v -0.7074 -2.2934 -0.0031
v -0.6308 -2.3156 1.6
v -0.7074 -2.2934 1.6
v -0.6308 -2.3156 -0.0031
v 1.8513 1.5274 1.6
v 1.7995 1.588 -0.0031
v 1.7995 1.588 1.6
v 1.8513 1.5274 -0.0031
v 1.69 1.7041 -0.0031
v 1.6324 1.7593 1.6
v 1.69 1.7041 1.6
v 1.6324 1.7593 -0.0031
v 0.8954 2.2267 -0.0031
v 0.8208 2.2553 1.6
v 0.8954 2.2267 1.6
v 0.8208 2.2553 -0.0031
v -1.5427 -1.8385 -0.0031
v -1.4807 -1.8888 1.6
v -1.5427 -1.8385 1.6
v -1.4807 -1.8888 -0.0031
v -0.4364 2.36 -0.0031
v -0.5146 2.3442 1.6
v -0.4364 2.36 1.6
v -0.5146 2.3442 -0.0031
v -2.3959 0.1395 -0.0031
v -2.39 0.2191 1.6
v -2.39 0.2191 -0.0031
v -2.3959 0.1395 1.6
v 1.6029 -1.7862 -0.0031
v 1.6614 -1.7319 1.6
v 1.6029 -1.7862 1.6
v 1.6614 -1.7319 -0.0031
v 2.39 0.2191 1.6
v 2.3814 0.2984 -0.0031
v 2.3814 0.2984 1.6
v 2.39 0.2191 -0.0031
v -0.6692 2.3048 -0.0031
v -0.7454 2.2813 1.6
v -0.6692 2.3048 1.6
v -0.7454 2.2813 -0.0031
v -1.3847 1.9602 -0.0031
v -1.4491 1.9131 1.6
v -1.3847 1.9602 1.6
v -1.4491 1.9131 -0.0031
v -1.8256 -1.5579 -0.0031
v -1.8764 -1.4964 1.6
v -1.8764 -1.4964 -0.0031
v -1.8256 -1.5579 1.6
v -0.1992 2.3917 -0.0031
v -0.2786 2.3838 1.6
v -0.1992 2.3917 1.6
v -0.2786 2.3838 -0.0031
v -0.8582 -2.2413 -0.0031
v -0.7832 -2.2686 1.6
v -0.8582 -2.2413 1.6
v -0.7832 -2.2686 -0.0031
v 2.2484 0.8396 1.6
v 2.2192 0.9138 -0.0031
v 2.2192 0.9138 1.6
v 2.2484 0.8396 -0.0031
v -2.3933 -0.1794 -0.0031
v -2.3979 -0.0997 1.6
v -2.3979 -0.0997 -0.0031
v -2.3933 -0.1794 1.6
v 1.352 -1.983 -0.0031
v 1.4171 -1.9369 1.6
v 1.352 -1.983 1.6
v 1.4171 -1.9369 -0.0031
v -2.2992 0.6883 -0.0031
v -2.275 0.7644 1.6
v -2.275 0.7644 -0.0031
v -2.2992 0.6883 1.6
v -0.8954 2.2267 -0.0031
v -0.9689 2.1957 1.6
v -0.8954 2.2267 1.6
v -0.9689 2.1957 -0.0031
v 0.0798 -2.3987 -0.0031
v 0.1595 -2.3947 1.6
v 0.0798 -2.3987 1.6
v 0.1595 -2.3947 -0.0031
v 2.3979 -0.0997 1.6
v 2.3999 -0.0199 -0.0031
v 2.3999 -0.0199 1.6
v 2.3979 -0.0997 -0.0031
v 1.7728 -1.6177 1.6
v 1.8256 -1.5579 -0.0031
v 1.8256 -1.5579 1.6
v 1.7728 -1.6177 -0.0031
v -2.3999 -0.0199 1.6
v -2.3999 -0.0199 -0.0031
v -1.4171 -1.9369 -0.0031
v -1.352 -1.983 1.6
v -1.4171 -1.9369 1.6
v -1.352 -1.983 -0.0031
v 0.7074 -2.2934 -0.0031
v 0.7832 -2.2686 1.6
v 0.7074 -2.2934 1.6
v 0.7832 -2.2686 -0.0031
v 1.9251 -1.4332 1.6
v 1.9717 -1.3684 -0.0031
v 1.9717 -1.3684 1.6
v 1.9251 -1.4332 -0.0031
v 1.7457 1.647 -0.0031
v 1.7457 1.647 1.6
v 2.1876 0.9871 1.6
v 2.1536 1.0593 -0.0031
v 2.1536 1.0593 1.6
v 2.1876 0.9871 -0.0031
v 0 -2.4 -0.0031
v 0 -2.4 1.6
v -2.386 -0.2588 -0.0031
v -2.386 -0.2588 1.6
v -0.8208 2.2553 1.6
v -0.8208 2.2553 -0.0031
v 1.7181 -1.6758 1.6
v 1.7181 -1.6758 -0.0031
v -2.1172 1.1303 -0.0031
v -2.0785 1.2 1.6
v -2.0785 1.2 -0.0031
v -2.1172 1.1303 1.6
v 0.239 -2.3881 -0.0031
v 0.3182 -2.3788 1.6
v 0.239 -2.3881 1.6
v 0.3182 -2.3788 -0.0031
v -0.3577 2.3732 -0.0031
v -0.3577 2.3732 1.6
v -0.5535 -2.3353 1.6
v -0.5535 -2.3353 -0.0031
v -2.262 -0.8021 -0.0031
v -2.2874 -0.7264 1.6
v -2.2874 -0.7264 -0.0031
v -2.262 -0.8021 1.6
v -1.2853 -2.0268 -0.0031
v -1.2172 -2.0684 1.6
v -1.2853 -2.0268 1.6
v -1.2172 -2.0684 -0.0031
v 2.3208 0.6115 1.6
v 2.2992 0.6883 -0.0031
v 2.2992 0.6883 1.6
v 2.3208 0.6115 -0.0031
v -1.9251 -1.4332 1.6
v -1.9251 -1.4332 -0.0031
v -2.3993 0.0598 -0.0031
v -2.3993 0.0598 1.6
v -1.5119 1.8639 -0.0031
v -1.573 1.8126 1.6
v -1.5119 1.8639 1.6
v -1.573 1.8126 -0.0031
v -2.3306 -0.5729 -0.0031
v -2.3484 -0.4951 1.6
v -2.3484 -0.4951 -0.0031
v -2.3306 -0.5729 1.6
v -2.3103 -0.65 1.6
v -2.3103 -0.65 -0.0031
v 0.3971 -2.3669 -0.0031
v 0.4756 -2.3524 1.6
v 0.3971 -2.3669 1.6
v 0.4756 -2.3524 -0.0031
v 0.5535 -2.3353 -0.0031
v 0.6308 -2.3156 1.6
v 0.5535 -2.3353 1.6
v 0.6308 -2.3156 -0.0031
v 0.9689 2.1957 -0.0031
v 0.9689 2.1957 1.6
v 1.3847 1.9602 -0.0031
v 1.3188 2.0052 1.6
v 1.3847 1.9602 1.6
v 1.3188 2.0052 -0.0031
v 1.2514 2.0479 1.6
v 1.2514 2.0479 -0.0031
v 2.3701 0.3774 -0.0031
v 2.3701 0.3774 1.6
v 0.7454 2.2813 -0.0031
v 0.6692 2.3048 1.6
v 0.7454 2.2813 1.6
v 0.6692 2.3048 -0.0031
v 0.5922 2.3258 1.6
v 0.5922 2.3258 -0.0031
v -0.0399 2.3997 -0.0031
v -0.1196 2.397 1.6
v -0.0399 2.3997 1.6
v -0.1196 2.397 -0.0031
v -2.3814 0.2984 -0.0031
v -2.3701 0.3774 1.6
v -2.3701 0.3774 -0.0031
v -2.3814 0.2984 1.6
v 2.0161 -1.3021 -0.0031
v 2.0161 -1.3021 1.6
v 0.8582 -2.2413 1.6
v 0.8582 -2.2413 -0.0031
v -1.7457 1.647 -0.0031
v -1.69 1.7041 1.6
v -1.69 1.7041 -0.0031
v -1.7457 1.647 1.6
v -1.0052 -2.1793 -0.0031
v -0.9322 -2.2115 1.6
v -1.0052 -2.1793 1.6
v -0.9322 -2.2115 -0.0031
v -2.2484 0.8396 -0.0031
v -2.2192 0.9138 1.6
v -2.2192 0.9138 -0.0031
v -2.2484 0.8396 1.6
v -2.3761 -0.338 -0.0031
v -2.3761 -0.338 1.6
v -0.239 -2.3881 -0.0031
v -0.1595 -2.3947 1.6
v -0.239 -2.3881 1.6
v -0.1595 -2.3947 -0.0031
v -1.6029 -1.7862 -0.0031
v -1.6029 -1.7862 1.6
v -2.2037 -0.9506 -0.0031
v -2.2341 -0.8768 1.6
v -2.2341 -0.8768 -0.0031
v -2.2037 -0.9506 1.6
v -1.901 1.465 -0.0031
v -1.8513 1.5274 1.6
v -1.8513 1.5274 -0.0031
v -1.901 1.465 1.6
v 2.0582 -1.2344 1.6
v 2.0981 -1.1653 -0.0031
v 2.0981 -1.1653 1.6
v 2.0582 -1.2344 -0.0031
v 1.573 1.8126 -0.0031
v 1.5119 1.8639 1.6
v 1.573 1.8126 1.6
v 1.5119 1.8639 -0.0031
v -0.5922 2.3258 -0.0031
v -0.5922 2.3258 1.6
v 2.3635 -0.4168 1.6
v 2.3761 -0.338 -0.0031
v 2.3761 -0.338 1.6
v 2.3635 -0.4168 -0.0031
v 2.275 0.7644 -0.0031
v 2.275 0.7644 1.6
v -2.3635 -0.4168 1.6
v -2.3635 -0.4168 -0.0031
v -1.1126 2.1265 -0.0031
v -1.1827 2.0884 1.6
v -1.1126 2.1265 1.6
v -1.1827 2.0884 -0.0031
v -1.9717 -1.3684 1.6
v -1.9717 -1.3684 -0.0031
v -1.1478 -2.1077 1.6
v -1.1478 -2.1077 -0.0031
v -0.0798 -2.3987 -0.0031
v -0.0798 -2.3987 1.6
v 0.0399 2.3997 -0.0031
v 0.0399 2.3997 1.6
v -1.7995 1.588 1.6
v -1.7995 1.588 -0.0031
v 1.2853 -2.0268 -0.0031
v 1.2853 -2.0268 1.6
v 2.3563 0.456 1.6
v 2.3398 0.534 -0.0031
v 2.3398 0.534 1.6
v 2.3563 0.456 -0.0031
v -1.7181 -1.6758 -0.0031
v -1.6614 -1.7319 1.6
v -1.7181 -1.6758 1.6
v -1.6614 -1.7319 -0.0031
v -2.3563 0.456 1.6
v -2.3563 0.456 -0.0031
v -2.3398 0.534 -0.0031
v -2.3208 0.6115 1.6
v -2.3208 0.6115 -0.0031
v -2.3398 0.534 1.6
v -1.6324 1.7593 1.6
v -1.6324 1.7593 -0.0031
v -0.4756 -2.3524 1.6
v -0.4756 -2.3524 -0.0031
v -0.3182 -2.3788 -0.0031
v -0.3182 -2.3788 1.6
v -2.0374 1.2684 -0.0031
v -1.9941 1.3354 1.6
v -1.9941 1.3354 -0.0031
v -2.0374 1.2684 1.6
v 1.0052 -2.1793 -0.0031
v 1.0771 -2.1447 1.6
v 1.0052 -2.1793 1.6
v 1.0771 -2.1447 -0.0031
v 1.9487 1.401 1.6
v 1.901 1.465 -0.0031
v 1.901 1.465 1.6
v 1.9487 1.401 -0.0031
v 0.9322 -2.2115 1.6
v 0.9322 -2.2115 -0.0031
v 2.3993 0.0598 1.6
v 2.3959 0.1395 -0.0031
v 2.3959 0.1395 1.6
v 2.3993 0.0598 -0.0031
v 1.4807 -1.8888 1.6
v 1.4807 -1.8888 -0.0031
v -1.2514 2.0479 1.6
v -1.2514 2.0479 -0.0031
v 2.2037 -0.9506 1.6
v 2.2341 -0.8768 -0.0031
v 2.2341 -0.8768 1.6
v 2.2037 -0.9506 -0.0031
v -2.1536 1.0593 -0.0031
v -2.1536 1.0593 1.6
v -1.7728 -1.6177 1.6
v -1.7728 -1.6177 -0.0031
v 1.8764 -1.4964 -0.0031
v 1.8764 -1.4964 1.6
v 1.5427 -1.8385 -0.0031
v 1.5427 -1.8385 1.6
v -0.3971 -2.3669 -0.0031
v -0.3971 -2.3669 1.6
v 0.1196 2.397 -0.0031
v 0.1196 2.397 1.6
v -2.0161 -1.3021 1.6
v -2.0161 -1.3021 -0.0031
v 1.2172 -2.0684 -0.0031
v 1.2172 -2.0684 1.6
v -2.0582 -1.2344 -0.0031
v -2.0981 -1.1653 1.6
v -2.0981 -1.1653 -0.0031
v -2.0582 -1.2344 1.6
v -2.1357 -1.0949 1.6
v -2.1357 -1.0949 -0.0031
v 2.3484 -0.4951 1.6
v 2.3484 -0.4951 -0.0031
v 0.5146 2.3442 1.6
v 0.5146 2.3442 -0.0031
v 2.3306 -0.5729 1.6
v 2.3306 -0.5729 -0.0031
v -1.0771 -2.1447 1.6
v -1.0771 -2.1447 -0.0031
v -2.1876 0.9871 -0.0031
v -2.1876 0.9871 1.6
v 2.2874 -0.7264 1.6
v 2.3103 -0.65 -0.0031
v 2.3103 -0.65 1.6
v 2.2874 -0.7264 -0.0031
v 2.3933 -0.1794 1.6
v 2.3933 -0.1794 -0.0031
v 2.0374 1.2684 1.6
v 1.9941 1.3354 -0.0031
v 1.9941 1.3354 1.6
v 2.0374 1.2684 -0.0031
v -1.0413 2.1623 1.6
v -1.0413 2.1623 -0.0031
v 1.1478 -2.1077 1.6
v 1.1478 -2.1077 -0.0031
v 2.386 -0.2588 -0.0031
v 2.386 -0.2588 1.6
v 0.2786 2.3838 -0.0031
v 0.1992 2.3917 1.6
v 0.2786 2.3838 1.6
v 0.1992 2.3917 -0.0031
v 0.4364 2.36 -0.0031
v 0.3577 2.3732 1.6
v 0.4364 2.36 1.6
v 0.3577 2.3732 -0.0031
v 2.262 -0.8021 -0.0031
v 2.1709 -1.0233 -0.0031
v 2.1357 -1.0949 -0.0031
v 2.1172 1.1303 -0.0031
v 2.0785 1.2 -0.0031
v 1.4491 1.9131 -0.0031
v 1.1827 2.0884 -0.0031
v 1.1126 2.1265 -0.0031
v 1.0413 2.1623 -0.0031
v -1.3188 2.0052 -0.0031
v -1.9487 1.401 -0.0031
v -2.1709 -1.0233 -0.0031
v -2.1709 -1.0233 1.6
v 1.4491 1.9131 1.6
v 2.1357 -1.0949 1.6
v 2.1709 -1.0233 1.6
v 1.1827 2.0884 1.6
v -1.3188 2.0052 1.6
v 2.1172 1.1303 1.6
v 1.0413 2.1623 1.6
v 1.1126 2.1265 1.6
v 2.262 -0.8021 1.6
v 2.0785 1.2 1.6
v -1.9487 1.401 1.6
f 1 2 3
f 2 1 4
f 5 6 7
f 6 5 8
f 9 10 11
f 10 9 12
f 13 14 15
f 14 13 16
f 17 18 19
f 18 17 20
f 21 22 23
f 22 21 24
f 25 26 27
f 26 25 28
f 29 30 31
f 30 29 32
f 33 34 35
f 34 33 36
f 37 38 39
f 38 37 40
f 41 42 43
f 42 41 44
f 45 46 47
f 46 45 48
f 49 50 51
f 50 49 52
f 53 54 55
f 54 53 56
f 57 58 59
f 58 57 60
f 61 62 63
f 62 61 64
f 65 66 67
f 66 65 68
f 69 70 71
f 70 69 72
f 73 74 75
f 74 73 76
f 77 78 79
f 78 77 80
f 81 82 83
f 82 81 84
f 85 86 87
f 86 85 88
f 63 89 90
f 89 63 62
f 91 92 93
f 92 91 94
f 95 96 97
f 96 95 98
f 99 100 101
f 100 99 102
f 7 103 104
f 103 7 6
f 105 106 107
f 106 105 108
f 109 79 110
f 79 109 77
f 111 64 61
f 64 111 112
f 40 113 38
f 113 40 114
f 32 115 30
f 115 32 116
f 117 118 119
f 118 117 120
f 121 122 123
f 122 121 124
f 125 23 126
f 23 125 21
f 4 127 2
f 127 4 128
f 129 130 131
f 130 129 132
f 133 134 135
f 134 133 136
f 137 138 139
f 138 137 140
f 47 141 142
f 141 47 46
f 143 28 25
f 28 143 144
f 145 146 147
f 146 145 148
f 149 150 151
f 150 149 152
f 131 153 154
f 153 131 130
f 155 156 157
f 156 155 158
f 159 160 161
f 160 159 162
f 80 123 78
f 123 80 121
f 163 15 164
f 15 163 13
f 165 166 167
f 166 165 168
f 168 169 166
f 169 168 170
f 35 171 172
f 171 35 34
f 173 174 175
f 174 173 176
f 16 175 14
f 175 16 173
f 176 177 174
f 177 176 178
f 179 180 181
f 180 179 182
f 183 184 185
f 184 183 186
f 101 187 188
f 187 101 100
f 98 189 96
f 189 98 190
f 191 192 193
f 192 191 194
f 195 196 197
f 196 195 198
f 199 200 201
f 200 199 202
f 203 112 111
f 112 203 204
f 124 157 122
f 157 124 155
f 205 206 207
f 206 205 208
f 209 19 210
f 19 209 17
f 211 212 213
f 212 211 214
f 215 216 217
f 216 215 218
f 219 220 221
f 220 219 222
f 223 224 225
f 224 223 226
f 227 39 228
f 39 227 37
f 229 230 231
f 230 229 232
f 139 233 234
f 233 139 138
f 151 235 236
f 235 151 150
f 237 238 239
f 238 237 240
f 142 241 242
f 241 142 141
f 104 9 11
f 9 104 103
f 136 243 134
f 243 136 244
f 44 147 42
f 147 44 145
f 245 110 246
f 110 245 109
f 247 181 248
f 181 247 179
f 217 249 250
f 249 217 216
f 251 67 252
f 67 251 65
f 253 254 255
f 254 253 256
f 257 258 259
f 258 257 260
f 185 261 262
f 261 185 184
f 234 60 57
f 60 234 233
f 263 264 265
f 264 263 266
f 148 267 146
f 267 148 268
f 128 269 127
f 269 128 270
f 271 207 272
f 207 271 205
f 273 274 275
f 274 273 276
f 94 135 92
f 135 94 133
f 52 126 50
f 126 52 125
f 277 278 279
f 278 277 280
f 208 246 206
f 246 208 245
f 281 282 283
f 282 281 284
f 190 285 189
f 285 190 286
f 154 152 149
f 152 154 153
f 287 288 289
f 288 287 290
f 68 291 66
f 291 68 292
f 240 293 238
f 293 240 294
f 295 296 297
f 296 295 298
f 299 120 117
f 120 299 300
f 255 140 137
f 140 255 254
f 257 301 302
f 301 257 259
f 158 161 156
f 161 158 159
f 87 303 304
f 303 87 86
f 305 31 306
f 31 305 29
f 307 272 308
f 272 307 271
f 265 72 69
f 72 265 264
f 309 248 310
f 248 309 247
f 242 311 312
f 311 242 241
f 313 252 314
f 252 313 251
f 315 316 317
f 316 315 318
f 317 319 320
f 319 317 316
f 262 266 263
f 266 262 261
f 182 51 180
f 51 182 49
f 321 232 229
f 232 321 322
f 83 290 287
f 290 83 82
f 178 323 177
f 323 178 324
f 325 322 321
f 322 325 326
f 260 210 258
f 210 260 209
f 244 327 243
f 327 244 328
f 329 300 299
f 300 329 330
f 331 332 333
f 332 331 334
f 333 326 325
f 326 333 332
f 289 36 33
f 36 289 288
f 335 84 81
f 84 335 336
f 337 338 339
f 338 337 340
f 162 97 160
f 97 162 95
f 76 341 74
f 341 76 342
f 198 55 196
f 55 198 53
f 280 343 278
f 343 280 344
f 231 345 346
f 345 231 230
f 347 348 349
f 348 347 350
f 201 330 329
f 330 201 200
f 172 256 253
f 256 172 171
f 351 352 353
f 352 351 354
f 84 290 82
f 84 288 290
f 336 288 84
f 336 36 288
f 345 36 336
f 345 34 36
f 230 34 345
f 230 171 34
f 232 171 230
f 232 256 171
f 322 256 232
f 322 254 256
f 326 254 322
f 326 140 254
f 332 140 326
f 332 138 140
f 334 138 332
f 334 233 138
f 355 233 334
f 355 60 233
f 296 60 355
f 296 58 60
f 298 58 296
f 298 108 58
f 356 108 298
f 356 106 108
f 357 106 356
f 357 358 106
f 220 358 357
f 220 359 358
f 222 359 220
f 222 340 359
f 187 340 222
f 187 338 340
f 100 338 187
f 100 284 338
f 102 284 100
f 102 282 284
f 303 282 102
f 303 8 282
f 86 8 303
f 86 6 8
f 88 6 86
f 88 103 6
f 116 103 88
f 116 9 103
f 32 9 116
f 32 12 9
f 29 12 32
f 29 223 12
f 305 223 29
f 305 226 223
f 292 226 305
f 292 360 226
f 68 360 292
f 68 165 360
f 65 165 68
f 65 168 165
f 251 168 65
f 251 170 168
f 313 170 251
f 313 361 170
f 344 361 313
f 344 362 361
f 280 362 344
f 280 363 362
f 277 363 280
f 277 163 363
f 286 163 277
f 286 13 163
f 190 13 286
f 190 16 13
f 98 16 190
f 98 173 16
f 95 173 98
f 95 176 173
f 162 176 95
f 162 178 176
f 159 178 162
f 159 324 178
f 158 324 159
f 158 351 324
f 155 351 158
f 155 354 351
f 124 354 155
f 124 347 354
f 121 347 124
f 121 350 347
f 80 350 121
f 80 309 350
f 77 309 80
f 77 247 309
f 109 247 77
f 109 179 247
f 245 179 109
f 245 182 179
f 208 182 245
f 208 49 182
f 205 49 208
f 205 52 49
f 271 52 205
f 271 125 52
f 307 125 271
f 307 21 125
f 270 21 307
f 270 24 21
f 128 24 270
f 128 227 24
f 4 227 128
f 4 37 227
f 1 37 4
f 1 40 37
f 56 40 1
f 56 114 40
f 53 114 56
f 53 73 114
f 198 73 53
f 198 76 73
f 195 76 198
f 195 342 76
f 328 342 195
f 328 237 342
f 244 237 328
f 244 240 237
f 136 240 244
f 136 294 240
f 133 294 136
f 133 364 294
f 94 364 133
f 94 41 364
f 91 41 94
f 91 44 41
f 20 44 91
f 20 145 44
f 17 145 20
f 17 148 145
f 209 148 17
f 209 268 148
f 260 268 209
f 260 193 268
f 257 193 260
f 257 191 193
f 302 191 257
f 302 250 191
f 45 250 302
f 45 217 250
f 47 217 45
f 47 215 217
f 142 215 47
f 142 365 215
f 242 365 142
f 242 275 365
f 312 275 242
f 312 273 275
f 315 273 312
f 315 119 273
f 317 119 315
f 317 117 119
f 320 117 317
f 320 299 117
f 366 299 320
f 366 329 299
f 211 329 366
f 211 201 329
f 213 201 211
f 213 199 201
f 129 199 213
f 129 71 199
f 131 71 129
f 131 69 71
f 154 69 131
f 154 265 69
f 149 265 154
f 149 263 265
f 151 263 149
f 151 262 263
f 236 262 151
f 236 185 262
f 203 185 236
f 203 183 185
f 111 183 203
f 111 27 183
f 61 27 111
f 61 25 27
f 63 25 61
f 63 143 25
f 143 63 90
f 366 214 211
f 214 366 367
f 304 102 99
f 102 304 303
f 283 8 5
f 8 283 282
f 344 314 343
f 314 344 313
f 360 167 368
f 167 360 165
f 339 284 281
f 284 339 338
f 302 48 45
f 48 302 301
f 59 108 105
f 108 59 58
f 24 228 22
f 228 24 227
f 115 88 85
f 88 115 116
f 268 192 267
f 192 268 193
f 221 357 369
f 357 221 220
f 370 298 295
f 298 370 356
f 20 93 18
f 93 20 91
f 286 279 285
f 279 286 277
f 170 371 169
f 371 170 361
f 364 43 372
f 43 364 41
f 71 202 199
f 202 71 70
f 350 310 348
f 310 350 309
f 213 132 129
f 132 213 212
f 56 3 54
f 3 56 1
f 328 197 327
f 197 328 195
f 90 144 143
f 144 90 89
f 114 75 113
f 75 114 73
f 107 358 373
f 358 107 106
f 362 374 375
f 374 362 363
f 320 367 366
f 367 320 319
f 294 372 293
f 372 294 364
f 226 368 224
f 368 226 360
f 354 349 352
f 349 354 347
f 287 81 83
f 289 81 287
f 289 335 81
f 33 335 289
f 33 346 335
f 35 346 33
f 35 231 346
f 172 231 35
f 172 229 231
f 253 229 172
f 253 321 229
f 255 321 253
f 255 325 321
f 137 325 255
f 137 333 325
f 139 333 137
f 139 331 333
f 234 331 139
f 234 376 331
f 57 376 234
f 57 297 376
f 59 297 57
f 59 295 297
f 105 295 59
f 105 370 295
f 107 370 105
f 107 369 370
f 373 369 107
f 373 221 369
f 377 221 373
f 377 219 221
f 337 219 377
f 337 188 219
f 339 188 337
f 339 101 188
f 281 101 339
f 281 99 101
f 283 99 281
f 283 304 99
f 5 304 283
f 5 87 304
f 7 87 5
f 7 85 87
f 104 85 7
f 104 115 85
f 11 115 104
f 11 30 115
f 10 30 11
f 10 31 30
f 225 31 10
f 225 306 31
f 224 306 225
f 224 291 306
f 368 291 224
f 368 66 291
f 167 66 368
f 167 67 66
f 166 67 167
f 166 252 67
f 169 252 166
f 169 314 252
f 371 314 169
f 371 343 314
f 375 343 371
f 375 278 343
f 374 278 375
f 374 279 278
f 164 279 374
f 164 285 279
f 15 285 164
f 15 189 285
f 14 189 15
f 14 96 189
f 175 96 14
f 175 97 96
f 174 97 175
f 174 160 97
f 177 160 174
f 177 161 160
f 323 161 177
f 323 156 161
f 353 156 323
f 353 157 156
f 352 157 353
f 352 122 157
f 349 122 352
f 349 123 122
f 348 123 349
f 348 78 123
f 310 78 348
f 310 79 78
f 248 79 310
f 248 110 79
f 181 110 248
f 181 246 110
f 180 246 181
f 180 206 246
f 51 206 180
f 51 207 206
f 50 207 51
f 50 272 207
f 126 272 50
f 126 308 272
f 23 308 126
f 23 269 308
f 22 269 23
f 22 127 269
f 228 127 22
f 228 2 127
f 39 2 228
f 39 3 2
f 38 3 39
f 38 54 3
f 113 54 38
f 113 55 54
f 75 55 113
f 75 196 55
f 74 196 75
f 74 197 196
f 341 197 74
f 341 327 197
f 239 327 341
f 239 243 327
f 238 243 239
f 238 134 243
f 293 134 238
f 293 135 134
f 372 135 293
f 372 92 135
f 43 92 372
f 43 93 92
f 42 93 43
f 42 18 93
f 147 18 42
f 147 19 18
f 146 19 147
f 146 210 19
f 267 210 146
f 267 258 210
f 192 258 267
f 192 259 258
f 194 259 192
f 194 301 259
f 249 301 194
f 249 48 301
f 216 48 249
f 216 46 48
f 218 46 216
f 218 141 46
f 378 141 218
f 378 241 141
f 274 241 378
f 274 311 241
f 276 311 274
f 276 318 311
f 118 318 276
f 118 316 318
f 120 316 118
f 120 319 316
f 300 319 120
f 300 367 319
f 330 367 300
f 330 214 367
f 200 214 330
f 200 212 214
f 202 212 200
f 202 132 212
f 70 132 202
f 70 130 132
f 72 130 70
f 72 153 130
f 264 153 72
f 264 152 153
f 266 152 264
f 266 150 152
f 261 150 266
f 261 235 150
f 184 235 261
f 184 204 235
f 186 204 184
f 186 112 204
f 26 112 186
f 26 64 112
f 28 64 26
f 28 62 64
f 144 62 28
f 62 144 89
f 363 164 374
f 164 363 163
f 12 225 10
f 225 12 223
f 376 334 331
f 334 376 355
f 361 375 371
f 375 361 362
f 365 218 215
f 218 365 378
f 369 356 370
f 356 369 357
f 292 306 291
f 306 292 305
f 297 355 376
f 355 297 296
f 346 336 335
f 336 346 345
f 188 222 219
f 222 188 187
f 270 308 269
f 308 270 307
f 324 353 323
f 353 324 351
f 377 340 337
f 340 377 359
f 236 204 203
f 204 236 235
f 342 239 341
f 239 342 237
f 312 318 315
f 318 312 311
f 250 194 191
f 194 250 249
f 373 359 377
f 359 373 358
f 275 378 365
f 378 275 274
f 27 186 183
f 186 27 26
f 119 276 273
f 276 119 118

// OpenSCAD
use <../lib.scad>
use <s/3960pv4a.scad>
use <s/3960pvb.scad>
use <s/3960s01.scad>
$fa=1; $fs=0.2;
function ldraw_lib__3960pv4(realsolid=false) = [
// 0 Dish  4 x  4 Inverted with Viking Blue and White Shield Pattern
// 0 Name: 3960pv4.dat
// 0 Author: Philippe Hurbain [Philo]
// 0 !LDRAW_ORG Part UPDATE 2010-02
// 0 !LICENSE Licensed under CC BY 2.0 and CC BY 4.0 : see CAreadme.txt
// 
// 0 BFC CERTIFY CCW
  [0,"BFC","CERTIFY"],
  [0,"BFC","CCW"],
// 
// 0 !KEYWORDS Round
// 
// 0 !HISTORY 2010-07-05 [PTadmin] Official Update 2010-02
// 
// 
// 1 16 0 0 0 1 0 0 0 1 0 0 0 1 s\3960s01.dat
  [1,16,0,0,0,1,0,0,0,1,0,0,0,1, ldraw_lib__s__3960s01(realsolid)],
// 1 16 0 0 0 1 0 0 0 1 0 0 0 1 s\3960pv4a.dat
  [1,16,0,0,0,1,0,0,0,1,0,0,0,1, ldraw_lib__s__3960pv4a(realsolid)],
// 1 16 0 0 0 1 0 0 0 1 0 0 0 1 s\3960pvb.dat
  [1,16,0,0,0,1,0,0,0,1,0,0,0,1, ldraw_lib__s__3960pvb(realsolid)],
// 1 16 0 0 0 -1 0 0 0 1 0 0 0 1 s\3960pvb.dat
  [1,16,0,0,0,-1,0,0,0,1,0,0,0,1, ldraw_lib__s__3960pvb(realsolid)],
// 1 16 0 0 0 0 0 -1 0 1 0 1 0 0 s\3960pvb.dat
  [1,16,0,0,0,0,0,-1,0,1,0,1,0,0, ldraw_lib__s__3960pvb(realsolid)],
// 1 16 0 0 0 0 0 -1 0 1 0 -1 0 0 s\3960pvb.dat
  [1,16,0,0,0,0,0,-1,0,1,0,-1,0,0, ldraw_lib__s__3960pvb(realsolid)],
// 1 16 0 0 0 0 0 1 0 1 0 -1 0 0 s\3960pvb.dat
  [1,16,0,0,0,0,0,1,0,1,0,-1,0,0, ldraw_lib__s__3960pvb(realsolid)],
// 1 16 0 0 0 0 0 1 0 1 0 1 0 0 s\3960pvb.dat
  [1,16,0,0,0,0,0,1,0,1,0,1,0,0, ldraw_lib__s__3960pvb(realsolid)],
// 1 16 0 0 0 -1 0 0 0 1 0 0 0 -1 s\3960pvb.dat
  [1,16,0,0,0,-1,0,0,0,1,0,0,0,-1, ldraw_lib__s__3960pvb(realsolid)],
// 1 16 0 0 0 1 0 0 0 1 0 0 0 -1 s\3960pvb.dat
  [1,16,0,0,0,1,0,0,0,1,0,0,0,-1, ldraw_lib__s__3960pvb(realsolid)],
// 0
];
module ldraw_lib__3960pv4(step=0, col=false, unit=2/5, alt=false, line=0.2, solid=!$preview)
    makepoly(ldraw_lib__3960pv4(solid), step=step, col=col, unit=unit, alt=alt, line=line, solid=solid);
ldraw_lib__3960pv4(line=0.2);
